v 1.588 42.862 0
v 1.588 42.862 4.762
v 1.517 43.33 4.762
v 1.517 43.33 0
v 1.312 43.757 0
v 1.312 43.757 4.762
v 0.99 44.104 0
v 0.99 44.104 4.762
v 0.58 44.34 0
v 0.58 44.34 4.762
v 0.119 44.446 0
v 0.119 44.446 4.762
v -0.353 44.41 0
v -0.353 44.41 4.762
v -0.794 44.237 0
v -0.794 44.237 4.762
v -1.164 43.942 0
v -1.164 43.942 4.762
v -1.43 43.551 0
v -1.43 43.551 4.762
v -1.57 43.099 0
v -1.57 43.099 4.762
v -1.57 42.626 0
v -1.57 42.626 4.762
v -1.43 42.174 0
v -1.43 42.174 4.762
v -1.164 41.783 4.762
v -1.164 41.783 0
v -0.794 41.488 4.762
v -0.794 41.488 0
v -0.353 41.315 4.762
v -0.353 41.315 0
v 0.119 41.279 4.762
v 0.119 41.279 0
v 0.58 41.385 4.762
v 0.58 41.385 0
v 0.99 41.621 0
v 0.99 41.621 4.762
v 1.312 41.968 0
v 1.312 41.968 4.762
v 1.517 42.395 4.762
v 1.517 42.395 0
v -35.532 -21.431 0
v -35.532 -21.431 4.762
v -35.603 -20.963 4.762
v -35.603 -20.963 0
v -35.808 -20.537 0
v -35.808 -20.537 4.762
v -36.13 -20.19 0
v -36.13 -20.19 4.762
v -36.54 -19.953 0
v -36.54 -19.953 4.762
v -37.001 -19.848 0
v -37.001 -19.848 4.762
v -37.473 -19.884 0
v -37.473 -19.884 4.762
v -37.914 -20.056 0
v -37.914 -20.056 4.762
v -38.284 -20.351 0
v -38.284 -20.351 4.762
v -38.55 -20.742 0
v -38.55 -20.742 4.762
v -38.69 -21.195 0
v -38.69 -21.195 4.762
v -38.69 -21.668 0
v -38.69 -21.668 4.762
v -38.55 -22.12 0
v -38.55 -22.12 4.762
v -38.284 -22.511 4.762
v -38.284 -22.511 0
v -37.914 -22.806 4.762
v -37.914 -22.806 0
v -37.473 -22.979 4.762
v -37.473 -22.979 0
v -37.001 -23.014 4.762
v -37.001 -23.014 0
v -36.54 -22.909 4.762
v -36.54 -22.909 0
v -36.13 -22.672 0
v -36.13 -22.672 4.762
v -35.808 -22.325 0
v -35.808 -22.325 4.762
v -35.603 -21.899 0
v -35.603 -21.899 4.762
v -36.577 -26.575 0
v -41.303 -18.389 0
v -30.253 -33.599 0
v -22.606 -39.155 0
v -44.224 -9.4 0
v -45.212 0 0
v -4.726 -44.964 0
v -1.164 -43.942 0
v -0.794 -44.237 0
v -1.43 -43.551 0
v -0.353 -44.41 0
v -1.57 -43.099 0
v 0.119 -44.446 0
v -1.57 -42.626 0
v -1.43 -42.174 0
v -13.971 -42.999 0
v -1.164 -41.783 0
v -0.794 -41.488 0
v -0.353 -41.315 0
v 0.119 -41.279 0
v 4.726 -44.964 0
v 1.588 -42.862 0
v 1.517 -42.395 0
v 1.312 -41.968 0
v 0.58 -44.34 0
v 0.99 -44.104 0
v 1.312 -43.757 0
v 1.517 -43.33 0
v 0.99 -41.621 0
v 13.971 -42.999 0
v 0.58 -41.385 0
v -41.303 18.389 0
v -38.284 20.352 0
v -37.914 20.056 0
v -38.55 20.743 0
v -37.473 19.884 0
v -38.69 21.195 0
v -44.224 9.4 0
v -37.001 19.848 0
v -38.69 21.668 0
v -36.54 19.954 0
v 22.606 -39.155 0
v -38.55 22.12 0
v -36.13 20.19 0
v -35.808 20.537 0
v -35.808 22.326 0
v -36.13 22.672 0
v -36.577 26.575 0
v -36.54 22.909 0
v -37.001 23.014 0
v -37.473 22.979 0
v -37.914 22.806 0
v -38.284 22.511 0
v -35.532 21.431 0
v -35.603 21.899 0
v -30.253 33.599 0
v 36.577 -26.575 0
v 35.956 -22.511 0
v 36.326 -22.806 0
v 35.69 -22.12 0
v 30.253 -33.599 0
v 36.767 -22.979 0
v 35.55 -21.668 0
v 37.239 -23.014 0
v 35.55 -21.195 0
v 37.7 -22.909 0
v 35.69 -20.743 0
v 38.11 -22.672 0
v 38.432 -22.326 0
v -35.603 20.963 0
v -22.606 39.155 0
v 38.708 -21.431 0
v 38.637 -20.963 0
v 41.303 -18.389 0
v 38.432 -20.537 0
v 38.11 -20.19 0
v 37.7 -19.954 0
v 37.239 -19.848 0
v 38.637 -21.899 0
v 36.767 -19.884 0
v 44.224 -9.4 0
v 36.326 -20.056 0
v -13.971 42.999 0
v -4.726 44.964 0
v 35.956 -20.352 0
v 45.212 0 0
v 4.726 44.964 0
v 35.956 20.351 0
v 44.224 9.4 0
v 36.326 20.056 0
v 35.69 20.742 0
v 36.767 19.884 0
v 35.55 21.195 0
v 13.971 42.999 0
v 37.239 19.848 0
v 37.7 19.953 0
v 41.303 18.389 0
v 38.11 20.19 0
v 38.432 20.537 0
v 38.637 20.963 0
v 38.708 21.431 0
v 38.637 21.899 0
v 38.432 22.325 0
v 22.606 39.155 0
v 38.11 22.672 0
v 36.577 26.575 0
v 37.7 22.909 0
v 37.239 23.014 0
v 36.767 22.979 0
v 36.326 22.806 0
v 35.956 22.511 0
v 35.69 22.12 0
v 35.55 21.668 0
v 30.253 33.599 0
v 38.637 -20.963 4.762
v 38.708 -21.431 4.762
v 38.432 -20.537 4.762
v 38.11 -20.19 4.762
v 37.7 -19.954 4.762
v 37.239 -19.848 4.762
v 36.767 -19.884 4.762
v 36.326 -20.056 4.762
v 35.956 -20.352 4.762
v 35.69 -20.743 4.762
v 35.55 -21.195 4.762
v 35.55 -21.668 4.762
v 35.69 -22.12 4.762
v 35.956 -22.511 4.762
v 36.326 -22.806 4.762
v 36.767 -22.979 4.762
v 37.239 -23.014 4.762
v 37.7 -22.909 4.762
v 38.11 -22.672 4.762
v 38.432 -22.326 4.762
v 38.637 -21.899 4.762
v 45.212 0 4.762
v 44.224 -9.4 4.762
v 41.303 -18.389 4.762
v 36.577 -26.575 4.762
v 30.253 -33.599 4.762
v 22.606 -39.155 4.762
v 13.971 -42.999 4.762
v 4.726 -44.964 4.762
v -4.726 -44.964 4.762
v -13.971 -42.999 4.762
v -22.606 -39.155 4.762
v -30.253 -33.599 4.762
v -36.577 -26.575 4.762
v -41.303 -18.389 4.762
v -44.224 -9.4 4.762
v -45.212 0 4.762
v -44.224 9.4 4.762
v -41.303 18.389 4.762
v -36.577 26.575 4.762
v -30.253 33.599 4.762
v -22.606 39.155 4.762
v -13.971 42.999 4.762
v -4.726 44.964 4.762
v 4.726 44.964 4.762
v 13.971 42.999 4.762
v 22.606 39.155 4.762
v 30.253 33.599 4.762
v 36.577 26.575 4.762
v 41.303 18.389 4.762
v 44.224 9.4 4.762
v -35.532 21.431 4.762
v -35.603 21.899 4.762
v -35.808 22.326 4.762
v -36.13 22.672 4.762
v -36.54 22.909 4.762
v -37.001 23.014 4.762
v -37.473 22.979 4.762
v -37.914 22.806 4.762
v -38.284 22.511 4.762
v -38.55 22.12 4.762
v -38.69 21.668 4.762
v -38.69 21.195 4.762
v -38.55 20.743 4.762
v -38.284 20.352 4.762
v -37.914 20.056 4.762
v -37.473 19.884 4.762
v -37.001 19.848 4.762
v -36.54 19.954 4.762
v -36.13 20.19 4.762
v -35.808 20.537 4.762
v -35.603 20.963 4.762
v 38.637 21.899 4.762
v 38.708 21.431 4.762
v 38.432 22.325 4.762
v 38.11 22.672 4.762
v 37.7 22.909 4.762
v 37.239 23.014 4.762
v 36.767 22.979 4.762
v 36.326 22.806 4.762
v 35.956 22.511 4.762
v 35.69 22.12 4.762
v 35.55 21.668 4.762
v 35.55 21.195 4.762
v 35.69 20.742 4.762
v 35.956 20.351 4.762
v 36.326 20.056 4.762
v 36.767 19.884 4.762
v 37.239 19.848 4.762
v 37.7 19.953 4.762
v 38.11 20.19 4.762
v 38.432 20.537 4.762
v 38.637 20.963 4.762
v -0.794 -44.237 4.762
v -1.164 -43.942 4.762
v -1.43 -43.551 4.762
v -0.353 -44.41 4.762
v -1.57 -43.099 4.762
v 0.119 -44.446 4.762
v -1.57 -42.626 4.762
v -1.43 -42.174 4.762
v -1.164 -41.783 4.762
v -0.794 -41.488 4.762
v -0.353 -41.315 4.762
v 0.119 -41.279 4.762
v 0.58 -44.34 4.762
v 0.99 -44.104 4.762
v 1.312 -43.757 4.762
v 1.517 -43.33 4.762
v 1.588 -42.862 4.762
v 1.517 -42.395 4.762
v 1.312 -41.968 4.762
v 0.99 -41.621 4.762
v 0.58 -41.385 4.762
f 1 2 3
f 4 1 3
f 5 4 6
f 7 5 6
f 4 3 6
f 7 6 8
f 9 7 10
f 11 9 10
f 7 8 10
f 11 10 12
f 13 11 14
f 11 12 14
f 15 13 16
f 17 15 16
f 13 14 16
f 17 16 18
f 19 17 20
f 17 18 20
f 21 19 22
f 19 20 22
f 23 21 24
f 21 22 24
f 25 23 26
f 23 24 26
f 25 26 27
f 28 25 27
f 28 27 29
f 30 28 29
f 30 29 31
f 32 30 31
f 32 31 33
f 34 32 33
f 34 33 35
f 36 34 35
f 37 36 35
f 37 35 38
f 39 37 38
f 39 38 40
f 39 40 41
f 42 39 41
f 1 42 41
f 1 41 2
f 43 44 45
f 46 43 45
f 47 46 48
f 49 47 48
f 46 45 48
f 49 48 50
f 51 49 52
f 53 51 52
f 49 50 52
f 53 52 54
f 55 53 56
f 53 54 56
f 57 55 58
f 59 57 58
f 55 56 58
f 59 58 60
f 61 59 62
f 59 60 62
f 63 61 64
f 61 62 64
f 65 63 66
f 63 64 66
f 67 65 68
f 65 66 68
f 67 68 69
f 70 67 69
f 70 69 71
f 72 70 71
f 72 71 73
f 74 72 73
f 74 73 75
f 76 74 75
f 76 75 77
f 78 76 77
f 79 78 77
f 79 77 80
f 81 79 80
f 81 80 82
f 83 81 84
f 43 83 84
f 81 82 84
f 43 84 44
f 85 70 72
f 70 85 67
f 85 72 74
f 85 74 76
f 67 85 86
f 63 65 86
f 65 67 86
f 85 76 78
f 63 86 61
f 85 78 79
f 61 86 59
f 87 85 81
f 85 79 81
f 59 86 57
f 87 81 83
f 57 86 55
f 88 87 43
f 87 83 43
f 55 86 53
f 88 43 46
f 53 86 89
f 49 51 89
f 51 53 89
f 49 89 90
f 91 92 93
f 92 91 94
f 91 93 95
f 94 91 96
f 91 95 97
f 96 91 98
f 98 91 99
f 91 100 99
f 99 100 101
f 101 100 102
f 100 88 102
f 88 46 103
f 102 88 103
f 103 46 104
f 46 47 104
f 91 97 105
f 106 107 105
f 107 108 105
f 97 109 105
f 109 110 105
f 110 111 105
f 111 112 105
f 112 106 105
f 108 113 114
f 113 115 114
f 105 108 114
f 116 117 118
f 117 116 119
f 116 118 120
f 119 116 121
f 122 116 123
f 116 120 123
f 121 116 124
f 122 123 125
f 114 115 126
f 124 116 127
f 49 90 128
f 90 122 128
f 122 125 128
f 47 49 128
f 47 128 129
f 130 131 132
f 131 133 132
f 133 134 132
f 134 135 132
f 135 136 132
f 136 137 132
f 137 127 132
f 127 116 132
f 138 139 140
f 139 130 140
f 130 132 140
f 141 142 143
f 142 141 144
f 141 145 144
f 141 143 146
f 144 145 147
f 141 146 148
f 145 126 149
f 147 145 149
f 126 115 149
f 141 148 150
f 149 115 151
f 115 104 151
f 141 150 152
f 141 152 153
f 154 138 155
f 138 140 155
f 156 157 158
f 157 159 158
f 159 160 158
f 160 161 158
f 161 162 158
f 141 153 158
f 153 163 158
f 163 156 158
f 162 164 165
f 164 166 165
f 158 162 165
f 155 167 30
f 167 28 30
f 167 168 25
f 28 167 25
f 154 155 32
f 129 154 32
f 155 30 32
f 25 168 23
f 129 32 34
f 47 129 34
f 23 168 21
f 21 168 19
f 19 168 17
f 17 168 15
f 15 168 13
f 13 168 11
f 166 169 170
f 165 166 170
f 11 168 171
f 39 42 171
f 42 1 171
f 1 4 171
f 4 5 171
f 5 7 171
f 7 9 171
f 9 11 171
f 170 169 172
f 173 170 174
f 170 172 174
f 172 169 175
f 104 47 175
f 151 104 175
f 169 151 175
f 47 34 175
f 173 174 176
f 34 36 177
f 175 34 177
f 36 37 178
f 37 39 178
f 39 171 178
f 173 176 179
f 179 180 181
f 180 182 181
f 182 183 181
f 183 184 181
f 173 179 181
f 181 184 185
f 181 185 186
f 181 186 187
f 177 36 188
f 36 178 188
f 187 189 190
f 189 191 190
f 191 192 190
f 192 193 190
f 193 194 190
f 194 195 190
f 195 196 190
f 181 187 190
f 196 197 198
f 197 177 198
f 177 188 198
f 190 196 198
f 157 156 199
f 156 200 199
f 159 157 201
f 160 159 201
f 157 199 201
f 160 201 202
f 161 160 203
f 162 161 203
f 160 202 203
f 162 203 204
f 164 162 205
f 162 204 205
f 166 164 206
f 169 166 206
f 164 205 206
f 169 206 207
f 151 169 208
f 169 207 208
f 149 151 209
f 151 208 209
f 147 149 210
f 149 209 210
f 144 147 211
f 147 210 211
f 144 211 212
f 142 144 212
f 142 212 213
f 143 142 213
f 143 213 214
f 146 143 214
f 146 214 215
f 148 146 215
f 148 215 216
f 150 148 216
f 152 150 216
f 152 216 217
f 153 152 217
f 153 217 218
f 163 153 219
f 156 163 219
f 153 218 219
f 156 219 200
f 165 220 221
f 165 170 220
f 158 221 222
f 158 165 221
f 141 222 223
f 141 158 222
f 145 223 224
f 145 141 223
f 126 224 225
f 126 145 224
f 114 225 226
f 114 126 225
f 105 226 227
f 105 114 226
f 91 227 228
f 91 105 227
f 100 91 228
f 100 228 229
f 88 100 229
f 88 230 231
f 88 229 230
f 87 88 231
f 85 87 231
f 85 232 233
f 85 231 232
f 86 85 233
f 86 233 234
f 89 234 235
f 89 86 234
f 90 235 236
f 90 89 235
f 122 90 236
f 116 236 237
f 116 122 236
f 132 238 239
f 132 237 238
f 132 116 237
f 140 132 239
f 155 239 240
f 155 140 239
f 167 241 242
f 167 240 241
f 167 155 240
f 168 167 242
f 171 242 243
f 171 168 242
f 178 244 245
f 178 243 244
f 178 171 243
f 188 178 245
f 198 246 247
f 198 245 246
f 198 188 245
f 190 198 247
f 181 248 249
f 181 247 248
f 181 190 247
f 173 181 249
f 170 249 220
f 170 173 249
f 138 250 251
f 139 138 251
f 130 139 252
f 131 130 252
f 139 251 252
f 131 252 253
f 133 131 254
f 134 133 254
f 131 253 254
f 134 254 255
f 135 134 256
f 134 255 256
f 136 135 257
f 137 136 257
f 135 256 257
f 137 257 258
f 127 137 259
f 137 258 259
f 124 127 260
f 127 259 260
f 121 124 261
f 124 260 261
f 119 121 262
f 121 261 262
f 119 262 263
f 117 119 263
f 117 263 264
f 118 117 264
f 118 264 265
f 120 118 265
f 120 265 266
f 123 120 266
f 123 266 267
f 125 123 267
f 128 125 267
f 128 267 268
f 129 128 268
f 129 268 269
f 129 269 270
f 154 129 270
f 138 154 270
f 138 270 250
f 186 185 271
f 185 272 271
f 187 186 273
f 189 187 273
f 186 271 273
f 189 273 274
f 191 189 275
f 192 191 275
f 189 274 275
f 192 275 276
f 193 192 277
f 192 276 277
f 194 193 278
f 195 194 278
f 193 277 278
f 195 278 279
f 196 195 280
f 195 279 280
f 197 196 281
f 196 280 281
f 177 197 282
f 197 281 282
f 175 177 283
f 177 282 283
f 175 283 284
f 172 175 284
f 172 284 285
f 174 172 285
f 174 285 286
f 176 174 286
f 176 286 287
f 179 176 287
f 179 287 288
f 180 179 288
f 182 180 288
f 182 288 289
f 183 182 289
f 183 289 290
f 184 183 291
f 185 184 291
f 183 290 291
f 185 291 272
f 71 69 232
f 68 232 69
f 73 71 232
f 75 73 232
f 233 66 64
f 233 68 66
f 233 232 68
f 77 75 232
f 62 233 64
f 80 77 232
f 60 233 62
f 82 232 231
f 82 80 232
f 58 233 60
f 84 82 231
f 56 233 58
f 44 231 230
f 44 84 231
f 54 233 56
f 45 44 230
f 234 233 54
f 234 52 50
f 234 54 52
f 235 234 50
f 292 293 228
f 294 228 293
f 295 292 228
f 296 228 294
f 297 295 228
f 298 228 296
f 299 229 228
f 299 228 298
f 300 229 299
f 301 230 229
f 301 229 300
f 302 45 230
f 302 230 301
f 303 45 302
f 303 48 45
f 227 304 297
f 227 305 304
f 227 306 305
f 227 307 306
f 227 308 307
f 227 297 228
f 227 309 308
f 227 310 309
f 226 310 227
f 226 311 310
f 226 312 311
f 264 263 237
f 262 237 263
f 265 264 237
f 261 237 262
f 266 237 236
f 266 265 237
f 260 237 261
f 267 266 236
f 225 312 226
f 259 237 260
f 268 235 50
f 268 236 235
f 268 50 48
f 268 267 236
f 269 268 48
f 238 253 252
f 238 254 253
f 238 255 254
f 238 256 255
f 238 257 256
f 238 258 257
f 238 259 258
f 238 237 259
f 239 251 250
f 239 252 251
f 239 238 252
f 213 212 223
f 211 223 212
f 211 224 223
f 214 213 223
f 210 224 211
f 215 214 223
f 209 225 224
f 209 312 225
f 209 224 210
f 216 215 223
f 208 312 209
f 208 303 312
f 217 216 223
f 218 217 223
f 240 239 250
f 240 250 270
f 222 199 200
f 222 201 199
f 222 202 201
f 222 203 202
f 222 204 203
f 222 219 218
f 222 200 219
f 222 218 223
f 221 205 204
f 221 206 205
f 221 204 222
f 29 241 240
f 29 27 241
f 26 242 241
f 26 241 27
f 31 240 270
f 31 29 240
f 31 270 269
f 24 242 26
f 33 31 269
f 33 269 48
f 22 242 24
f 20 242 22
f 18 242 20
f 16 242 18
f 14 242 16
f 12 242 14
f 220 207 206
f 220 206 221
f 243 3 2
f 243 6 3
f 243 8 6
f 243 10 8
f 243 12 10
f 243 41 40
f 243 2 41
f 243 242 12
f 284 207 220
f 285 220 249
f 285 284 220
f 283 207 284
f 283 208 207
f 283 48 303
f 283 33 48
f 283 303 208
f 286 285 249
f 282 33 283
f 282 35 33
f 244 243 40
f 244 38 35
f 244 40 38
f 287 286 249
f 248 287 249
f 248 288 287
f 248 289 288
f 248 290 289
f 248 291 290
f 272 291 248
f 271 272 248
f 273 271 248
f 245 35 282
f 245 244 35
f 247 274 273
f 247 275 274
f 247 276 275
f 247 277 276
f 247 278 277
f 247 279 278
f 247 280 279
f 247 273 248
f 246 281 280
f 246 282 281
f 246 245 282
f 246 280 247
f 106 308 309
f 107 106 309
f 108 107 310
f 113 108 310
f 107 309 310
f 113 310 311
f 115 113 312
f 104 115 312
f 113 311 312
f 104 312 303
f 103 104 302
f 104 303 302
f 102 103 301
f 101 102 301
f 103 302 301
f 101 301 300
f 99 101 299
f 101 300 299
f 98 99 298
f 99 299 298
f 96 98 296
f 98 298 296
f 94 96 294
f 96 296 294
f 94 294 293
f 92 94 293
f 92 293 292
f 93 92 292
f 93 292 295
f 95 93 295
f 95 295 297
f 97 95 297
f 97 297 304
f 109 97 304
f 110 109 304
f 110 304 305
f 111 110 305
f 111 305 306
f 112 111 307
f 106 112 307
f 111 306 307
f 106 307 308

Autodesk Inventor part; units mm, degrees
ref_plane "YZ Plane" through (0, 0, 0) normal (1, 0, 0) x (0, 1, 0)
ref_plane "XZ Plane" through (0, 0, 0) normal (0, 1, 0) x (-1, 0, 0)
ref_plane "XY Plane" through (0, 0, 0) normal (0, 0, 1) x (1, 0, 0)
sketch "Sketch1" plane through (0, 0, 0) normal (0, 0, 1) x (1, 0, 0)
  circle A0 centre (0, 0) radius 45.212
  dimension "d0" = 90.424
extrude "Extrusion1" add sketch "Sketch1" along normal blind 4.7625
sketch "Sketch4" plane through (0, 0, 4.7625) normal (0, 0, 1) x (1, 0, 0)
  circle A0 centre (0, 42.8625) radius 1.5875
  circle A1 centre (-37.12, 21.4313) radius 1.5875
  circle A2 centre (-37.12, -21.4312) radius 1.5875
  circle A3 centre (0, -42.8625) radius 1.5875
  circle A4 centre (37.12, -21.4313) radius 1.5875
  circle A5 centre (37.12, 21.4312) radius 1.5875
  point P0 (0, 0)
  dimension "d14" = 3.175
  dimension "d15" = 42.8625
  dimension "d18" = 360
extrude "Extrusion4" cut sketch "Sketch4" against normal blind 25.4
properties part number "AluminumSealingDiscMidshipsMiddle" material "Aluminum 6061"
